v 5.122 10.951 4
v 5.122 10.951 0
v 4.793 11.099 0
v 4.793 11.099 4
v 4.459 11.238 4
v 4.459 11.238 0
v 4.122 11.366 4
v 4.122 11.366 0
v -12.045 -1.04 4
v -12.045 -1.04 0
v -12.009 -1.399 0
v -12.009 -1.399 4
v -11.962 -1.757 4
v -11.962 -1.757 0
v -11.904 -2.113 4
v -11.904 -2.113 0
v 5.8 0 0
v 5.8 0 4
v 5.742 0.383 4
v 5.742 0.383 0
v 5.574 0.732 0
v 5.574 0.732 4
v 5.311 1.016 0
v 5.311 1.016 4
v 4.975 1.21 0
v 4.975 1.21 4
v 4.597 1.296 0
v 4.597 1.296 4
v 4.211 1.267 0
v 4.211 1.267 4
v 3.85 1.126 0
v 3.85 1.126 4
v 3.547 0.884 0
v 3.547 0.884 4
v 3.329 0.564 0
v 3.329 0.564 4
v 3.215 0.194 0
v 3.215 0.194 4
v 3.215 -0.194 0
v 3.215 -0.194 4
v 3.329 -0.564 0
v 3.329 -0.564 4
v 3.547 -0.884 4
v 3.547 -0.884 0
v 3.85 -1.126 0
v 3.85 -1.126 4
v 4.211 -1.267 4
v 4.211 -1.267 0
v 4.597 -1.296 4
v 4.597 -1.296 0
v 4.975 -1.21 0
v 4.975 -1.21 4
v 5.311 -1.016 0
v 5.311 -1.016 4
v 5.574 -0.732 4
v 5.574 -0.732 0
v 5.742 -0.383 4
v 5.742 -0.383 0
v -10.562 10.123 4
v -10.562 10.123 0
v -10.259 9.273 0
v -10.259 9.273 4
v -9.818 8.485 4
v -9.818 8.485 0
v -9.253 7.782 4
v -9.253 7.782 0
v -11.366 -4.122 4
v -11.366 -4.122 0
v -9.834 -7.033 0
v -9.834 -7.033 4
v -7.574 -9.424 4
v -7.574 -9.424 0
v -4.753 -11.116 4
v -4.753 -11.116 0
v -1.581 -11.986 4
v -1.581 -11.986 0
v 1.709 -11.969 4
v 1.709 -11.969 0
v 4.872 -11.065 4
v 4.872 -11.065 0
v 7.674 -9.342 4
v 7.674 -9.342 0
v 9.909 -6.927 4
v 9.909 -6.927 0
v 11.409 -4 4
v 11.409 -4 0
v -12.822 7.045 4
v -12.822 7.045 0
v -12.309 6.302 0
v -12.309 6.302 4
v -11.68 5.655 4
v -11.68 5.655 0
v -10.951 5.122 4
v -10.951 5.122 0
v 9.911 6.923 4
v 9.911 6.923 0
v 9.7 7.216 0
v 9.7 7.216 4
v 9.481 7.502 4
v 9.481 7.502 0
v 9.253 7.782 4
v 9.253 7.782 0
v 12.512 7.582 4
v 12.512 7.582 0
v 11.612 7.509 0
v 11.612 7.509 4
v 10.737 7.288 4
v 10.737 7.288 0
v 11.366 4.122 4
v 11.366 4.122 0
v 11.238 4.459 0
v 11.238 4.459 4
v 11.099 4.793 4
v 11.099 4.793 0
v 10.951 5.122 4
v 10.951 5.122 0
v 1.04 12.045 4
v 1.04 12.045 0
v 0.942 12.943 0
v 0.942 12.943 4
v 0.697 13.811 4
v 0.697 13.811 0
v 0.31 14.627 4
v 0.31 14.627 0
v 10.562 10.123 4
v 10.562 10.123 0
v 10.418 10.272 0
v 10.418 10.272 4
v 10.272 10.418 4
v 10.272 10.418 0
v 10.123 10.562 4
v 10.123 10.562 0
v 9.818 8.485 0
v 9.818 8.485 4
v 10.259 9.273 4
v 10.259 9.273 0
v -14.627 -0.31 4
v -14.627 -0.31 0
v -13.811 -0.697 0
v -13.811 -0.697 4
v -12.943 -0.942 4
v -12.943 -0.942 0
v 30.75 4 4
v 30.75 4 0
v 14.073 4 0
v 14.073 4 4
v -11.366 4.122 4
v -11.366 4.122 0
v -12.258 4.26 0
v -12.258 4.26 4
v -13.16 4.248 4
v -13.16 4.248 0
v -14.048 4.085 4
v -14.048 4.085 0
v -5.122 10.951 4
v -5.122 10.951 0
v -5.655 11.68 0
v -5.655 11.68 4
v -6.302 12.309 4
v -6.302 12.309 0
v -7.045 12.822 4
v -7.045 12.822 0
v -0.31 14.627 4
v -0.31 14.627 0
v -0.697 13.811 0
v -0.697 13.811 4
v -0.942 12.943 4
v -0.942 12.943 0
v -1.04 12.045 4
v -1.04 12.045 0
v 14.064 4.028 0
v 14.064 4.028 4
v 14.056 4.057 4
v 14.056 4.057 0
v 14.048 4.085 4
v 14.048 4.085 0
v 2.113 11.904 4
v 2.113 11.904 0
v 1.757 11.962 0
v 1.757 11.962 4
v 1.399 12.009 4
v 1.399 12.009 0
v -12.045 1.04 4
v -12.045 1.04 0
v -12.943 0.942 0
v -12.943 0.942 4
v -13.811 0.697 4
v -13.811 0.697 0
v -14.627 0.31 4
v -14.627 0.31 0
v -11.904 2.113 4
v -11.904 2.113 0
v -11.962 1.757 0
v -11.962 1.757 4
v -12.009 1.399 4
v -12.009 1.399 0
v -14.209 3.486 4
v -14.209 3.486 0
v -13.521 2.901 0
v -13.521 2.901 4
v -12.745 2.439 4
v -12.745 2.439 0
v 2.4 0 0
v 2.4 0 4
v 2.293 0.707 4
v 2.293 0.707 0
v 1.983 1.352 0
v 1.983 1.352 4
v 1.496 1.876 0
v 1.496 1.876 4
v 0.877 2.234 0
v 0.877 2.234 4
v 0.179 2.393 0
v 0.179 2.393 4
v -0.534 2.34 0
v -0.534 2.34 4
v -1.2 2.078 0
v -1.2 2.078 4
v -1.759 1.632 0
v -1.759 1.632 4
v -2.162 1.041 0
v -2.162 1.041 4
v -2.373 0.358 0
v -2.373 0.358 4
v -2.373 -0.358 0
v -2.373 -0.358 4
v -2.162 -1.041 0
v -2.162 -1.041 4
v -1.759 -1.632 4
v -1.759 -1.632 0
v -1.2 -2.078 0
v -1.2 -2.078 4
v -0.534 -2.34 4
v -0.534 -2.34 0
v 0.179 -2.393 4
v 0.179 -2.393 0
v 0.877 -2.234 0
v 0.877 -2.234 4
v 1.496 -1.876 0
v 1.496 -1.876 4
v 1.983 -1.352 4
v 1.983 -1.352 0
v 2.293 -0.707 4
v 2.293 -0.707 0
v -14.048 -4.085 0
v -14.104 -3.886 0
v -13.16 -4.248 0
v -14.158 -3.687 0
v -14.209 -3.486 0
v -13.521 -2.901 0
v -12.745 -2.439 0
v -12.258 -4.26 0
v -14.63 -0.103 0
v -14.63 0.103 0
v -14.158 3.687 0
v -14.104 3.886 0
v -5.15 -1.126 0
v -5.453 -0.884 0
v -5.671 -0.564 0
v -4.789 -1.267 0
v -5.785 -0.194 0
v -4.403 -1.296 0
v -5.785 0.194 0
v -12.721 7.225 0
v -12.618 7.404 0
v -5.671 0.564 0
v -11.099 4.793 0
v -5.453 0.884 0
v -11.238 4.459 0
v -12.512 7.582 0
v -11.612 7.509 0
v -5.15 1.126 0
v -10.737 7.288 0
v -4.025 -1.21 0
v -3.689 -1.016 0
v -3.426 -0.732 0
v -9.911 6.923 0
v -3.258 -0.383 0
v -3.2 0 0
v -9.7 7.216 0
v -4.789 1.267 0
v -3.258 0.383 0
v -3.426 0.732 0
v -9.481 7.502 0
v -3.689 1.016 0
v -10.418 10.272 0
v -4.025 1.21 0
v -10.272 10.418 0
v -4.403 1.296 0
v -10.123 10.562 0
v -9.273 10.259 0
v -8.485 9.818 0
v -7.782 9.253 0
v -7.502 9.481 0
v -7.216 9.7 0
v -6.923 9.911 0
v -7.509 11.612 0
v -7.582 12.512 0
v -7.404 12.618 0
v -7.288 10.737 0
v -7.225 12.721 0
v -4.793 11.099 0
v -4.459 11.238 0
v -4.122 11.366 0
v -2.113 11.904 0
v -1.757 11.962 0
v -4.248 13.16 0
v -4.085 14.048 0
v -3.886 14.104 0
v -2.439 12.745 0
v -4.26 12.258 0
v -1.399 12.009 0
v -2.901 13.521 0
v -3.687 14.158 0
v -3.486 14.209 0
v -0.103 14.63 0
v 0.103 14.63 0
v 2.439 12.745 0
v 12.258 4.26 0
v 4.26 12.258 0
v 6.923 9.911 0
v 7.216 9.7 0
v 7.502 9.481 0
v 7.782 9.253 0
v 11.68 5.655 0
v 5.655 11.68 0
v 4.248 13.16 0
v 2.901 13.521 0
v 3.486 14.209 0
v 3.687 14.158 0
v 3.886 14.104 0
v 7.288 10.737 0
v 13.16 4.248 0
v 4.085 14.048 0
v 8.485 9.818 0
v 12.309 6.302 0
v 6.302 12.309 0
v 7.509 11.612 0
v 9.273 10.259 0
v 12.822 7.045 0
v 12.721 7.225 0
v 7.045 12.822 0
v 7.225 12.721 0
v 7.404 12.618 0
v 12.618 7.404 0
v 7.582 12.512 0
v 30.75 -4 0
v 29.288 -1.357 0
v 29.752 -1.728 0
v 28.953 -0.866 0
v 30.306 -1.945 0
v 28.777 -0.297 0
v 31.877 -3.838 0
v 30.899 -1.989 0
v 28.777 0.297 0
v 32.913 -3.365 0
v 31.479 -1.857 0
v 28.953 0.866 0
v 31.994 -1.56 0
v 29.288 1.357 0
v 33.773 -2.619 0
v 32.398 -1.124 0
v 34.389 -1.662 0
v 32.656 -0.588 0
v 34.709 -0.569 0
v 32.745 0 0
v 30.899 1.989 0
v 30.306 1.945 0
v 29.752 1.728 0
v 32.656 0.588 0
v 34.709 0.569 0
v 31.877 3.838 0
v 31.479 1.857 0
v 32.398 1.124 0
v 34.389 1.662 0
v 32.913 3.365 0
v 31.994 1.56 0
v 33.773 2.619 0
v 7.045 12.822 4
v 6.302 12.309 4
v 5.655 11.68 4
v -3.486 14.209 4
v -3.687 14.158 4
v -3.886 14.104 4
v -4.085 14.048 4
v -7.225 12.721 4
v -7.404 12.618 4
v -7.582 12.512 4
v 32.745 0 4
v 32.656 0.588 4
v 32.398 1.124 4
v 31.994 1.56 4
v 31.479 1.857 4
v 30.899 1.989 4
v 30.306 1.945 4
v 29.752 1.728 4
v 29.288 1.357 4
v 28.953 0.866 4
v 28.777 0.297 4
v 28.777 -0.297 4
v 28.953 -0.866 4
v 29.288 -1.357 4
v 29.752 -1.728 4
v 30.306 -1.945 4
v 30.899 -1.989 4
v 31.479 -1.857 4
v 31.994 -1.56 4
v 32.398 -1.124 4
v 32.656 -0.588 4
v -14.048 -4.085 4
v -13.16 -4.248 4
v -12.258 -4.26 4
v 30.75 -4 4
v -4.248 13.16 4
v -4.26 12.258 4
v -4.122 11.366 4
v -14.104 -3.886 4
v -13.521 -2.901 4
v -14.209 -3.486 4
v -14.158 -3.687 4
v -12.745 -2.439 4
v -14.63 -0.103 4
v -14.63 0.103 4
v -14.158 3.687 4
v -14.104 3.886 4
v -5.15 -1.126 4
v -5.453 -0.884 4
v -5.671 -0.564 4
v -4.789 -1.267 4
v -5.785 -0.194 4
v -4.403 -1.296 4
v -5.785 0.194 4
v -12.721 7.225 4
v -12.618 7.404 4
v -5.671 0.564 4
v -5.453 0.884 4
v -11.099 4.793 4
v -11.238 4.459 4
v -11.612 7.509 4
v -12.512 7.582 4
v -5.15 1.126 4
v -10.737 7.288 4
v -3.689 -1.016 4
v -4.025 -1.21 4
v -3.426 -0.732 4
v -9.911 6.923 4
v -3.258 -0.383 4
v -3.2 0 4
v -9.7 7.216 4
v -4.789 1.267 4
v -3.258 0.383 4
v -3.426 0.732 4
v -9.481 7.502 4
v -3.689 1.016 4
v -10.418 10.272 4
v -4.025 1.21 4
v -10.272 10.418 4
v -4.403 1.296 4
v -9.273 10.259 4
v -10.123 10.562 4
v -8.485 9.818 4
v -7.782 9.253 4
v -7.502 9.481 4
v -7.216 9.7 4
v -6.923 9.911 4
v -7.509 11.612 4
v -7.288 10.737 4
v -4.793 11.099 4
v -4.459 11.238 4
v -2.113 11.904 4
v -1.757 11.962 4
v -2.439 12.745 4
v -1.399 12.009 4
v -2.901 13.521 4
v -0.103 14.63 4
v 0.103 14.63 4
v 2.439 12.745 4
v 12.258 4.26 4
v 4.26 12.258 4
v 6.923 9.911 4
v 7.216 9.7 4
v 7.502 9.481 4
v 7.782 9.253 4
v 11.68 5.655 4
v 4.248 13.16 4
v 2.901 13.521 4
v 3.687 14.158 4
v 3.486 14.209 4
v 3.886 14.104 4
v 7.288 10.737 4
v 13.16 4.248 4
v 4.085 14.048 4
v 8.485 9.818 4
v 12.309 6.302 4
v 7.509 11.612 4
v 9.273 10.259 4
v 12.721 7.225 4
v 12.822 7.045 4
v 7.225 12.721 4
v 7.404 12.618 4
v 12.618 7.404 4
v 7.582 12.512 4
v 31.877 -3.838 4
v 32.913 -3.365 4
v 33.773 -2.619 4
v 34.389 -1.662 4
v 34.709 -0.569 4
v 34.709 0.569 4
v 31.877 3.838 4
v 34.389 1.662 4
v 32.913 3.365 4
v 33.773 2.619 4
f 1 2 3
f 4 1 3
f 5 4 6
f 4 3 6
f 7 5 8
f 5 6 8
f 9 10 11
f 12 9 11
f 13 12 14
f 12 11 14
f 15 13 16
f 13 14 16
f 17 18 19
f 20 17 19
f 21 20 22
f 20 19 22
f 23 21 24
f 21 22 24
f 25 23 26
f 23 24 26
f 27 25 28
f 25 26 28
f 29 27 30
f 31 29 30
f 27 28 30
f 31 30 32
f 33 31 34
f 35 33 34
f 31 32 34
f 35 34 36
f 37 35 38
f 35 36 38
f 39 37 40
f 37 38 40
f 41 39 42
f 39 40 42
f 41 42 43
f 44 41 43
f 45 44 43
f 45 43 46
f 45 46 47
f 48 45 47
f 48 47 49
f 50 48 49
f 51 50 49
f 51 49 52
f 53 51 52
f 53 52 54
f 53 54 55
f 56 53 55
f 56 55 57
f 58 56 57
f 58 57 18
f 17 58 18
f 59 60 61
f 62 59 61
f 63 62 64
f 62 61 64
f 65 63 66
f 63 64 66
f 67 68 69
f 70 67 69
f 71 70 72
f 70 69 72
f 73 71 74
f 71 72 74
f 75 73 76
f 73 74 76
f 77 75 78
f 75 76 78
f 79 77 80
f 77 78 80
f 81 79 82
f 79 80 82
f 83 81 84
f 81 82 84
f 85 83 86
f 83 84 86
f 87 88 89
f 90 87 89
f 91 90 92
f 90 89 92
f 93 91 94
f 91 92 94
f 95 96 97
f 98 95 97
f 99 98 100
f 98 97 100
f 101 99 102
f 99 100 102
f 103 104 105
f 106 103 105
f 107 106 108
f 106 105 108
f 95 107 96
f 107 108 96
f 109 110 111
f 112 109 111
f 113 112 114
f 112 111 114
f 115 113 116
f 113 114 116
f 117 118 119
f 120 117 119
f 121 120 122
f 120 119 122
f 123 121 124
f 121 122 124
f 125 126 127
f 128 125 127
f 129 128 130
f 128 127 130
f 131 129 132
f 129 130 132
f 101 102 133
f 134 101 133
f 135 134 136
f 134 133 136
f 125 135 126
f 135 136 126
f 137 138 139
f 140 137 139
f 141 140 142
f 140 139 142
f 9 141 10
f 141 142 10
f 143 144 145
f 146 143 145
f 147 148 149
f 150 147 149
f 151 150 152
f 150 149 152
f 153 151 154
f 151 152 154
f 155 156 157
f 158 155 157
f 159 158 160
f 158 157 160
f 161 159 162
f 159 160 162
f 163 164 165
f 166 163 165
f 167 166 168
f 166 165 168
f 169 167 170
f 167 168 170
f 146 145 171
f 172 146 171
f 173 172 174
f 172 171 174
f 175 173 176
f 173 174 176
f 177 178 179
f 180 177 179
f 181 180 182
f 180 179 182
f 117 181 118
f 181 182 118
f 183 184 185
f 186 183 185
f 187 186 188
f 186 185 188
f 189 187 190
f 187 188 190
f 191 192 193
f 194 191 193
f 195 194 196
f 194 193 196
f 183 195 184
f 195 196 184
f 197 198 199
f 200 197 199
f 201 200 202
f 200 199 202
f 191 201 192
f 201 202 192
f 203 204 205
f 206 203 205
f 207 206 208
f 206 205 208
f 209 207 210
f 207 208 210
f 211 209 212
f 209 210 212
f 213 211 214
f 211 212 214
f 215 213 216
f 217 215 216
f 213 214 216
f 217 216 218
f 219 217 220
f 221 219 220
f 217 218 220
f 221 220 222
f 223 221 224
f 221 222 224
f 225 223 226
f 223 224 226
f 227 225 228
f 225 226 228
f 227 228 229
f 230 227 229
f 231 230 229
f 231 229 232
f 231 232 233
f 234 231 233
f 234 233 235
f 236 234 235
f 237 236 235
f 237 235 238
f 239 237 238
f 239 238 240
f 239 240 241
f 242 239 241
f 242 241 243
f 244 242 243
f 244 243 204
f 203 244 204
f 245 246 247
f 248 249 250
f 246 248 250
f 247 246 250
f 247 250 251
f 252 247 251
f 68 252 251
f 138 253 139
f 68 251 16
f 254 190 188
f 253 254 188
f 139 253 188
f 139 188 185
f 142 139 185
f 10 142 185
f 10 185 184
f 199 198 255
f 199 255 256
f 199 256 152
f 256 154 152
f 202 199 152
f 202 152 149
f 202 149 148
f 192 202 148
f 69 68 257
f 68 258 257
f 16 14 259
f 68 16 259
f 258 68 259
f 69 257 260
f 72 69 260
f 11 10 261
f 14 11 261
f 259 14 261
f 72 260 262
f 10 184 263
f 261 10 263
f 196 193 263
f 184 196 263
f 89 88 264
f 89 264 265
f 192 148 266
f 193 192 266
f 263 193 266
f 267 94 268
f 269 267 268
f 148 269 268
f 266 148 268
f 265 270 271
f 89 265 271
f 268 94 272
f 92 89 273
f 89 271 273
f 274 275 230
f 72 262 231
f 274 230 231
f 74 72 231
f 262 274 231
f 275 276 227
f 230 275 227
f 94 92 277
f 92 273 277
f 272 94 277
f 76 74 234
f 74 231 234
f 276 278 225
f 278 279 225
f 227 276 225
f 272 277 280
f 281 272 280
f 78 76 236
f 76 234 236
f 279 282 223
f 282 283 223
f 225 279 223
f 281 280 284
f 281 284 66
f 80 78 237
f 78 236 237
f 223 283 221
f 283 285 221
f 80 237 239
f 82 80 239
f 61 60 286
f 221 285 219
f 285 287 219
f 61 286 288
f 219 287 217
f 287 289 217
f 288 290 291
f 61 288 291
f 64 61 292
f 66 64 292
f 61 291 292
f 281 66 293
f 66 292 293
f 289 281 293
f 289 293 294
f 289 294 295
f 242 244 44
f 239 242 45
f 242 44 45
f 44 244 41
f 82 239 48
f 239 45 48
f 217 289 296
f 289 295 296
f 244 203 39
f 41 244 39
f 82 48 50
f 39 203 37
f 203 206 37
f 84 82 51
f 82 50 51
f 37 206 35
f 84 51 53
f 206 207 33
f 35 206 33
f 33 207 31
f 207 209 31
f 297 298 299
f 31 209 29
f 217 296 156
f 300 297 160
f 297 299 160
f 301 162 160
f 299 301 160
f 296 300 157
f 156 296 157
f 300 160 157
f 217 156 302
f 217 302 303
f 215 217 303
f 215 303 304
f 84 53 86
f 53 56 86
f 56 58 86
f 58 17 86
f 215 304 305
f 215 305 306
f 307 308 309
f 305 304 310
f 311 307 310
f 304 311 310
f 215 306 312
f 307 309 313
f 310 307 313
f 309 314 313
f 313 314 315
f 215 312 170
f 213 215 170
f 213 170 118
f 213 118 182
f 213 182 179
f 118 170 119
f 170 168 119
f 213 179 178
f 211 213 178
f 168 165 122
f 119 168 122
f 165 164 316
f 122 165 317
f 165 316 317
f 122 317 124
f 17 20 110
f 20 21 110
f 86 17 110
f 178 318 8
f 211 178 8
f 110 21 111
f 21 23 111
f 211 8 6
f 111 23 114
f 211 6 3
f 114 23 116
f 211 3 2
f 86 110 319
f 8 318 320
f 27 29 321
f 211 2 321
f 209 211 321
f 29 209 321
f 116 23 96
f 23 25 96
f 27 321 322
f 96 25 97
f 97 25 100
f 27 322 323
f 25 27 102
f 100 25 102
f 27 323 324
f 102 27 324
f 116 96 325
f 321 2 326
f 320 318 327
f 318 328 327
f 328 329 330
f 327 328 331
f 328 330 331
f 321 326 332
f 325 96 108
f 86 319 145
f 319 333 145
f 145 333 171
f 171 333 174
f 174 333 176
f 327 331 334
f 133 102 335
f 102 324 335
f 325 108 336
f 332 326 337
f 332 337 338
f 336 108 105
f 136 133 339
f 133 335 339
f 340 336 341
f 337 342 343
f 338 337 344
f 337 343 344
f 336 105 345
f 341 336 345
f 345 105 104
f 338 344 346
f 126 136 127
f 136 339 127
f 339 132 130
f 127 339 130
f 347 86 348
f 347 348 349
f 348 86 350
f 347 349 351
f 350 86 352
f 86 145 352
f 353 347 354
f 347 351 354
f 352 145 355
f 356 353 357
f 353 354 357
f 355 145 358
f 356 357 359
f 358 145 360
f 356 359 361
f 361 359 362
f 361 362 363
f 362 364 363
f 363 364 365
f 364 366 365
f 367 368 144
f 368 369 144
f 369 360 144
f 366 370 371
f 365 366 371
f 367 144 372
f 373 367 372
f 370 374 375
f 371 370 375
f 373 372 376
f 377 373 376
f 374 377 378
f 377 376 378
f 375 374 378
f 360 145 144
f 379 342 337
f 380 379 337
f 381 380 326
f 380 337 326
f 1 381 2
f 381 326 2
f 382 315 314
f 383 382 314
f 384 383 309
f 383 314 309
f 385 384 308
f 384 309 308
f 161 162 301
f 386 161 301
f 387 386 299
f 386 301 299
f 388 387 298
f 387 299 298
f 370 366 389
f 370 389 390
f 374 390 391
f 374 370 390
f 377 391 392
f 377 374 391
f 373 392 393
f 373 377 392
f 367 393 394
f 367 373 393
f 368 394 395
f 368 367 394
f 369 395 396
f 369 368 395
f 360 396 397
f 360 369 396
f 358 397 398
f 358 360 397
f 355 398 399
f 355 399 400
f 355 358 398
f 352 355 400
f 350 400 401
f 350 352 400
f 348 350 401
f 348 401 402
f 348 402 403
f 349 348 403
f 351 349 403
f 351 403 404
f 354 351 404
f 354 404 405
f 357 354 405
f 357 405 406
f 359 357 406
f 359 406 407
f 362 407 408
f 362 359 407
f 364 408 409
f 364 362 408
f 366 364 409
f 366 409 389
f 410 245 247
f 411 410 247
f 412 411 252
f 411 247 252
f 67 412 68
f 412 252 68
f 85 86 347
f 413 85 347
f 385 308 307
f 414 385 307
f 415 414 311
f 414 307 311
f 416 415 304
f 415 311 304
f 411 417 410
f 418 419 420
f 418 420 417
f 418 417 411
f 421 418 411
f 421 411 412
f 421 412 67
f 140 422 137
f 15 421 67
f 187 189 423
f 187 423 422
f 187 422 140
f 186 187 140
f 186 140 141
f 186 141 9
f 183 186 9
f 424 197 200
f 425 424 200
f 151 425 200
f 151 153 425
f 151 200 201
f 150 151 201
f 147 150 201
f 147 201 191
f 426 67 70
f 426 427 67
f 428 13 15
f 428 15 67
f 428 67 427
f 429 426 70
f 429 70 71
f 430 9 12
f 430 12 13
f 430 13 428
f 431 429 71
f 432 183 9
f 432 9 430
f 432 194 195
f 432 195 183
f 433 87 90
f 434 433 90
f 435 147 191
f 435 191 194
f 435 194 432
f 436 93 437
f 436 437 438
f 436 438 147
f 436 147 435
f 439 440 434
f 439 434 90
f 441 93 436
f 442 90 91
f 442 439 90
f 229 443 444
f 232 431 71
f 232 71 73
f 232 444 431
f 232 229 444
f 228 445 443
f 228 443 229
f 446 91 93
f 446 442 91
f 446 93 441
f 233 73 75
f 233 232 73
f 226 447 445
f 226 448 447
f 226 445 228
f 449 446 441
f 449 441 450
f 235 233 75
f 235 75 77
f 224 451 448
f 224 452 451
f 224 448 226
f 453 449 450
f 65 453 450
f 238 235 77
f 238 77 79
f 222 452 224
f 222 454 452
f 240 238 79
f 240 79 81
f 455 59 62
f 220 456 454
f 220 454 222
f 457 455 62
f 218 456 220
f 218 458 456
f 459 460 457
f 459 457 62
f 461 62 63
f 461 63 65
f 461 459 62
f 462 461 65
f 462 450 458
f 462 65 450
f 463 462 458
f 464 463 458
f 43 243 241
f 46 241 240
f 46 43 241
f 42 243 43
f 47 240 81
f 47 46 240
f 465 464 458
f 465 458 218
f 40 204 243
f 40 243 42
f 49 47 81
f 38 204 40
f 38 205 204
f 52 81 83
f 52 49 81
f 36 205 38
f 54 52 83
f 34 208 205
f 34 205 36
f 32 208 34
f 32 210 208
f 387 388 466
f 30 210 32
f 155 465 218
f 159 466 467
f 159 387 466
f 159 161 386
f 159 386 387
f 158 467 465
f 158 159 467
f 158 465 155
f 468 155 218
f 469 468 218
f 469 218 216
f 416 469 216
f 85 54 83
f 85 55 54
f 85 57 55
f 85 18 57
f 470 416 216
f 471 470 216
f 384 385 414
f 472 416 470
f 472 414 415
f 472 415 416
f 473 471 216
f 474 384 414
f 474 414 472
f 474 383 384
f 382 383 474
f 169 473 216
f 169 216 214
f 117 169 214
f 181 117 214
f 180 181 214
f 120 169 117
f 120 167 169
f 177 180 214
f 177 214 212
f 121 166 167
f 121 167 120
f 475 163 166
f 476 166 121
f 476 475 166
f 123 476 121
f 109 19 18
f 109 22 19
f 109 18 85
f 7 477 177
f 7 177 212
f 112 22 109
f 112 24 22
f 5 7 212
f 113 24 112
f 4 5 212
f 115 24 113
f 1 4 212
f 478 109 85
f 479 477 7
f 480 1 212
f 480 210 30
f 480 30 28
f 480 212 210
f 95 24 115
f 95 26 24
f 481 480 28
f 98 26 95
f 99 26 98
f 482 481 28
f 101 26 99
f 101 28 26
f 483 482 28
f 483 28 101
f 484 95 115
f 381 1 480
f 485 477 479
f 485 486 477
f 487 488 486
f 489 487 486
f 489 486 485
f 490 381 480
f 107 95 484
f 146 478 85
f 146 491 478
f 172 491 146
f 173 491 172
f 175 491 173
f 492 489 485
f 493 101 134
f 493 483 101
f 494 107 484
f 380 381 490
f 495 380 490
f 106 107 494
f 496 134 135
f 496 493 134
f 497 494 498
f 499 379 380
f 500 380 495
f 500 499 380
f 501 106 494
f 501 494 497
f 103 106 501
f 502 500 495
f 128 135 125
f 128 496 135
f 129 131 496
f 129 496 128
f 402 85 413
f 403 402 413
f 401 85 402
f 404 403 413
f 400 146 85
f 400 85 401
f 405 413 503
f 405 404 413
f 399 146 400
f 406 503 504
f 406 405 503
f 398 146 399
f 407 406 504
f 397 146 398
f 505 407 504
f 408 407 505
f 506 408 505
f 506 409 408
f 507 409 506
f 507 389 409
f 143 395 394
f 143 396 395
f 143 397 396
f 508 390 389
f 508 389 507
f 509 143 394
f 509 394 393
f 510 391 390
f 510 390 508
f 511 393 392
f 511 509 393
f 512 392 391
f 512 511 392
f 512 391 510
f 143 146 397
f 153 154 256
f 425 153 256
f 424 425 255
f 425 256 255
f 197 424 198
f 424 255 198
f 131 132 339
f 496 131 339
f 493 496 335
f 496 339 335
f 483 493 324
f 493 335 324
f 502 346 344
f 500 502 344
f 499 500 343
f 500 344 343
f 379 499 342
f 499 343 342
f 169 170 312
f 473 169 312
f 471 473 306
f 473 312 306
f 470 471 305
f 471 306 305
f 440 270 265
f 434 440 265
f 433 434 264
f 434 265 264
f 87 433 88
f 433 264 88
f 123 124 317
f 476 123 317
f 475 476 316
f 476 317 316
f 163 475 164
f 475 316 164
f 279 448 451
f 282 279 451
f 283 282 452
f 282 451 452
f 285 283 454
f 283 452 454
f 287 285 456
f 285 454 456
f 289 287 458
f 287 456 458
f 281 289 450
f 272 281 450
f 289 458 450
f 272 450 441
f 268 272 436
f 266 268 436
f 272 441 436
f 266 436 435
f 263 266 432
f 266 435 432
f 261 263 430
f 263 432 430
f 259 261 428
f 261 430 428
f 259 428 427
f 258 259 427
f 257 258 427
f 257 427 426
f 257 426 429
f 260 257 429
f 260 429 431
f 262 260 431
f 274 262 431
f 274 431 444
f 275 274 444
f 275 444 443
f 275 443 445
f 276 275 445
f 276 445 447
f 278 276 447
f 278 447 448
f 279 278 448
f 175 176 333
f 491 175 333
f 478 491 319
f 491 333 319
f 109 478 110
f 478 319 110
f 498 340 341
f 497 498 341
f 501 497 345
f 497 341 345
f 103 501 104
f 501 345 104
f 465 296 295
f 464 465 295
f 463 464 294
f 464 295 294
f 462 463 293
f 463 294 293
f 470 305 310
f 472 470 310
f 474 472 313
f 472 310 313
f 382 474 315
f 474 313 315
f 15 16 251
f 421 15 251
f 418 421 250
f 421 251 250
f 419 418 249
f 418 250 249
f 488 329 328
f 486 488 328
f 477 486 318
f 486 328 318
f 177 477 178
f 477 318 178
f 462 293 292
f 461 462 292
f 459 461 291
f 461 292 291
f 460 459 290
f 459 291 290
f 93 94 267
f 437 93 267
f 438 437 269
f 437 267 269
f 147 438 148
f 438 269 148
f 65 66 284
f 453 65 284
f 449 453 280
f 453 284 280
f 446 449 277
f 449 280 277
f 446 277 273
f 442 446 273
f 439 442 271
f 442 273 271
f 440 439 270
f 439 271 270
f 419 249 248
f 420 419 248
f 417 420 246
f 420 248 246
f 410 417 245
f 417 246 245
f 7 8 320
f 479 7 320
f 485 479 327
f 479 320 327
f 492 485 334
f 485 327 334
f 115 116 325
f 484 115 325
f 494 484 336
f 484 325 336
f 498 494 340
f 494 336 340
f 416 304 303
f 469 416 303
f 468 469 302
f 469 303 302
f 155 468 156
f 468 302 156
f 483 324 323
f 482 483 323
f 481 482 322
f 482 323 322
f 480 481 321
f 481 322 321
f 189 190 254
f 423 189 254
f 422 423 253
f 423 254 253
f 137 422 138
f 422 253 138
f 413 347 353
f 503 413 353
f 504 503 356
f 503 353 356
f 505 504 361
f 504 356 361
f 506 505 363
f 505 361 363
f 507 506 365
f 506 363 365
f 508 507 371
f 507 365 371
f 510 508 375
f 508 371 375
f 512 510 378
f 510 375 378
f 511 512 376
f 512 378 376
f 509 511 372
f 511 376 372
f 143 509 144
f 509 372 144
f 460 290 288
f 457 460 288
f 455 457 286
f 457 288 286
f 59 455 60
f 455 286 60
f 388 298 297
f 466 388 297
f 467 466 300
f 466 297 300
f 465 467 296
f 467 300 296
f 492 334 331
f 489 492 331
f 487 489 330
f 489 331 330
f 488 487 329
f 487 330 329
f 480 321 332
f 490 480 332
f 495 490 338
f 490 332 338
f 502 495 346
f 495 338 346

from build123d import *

# Parameters (mm, degrees)
SKETCH2_R           = 1.75
SKETCH2_R_2         = 1.995
BOSS_EXTRUDE1_DEPTH = 4
SKETCH4_R           = 1.3
SKETCH4_R_2         = 2.4
CUT_EXTRUDE1_DEPTH  = 5


with BuildPart() as part:
    # Sketch2 → Boss-Extrude1 (new body)
    with BuildSketch(Plane.XY):
        with BuildLine():
            ThreePointArc((30.75, -4), (34.75, 0), (30.75, 4))
            Line((30.75, 4), (14.072558403, 4))
            ThreePointArc((14.072558403, 4), (14.06038767, 4.04257326), (14.048088143, 4.085109489))
            ThreePointArc((14.048088143, 4.085109489), (12.709169027, 4.272836063), (11.365584201, 4.122086336))
            ThreePointArc((11.365584201, 4.122086336), (11.169703548, 4.626642697), (10.951436862, 5.12192646))
            ThreePointArc((10.951436862, 5.12192646), (12.008090957, 5.965388247), (12.82210701, 7.044889767))
            ThreePointArc((12.82210701, 7.044889767), (12.669951657, 7.315), (12.51210701, 7.581825517))
            ThreePointArc((12.51210701, 7.581825517), (11.170223244, 7.416617696), (9.911436862, 6.9232593))
            ThreePointArc((9.911436862, 6.9232593), (9.591641884, 7.359925677), (9.252623584, 7.781841479))
            ThreePointArc((9.252623584, 7.781841479), (10.05496909, 8.870045207), (10.561852666, 10.123446462))
            ThreePointArc((10.561852666, 10.123446462), (10.344972209, 10.344972209), (10.123446462, 10.561852666))
            ThreePointArc((10.123446462, 10.561852666), (8.870045207, 10.05496909), (7.781841479, 9.252623584))
            ThreePointArc((7.781841479, 9.252623584), (7.359925677, 9.591641884), (6.9232593, 9.911436862))
            ThreePointArc((6.9232593, 9.911436862), (7.416617696, 11.170223244), (7.581825517, 12.51210701))
            ThreePointArc((7.581825517, 12.51210701), (7.315, 12.669951657), (7.044889767, 12.82210701))
            ThreePointArc((7.044889767, 12.82210701), (5.965388247, 12.008090957), (5.12192646, 10.951436862))
            ThreePointArc((5.12192646, 10.951436862), (4.626642697, 11.169703548), (4.122086336, 11.365584201))
            ThreePointArc((4.122086336, 11.365584201), (4.272836063, 12.709169027), (4.085109489, 14.048088143))
            ThreePointArc((4.085109489, 14.048088143), (3.78652263, 14.131494839), (3.486235477, 14.208555951))
            ThreePointArc((3.486235477, 14.208555951), (2.654199937, 13.14288127), (2.112960617, 11.903927815))
            ThreePointArc((2.112960617, 11.903927815), (1.578061664, 11.986568374), (1.04, 12.04518576))
            ThreePointArc((1.04, 12.04518576), (0.837867713, 13.382005944), (0.31, 14.626715284))
            ThreePointArc((0.31, 14.626715284), (0, 14.63), (-0.31, 14.626715284))
            ThreePointArc((-0.31, 14.626715284), (-0.837867713, 13.382005944), (-1.04, 12.04518576))
            ThreePointArc((-1.04, 12.04518576), (-1.578061664, 11.986568374), (-2.112960617, 11.903927815))
            ThreePointArc((-2.112960617, 11.903927815), (-2.654199937, 13.14288127), (-3.486235477, 14.208555951))
            ThreePointArc((-3.486235477, 14.208555951), (-3.78652263, 14.131494839), (-4.085109489, 14.048088143))
            ThreePointArc((-4.085109489, 14.048088143), (-4.272836063, 12.709169027), (-4.122086336, 11.365584201))
            ThreePointArc((-4.122086336, 11.365584201), (-4.626642697, 11.169703548), (-5.12192646, 10.951436862))
            ThreePointArc((-5.12192646, 10.951436862), (-5.965388247, 12.008090957), (-7.044889767, 12.82210701))
            ThreePointArc((-7.044889767, 12.82210701), (-7.315, 12.669951657), (-7.581825517, 12.51210701))
            ThreePointArc((-7.581825517, 12.51210701), (-7.416617696, 11.170223244), (-6.9232593, 9.911436862))
            ThreePointArc((-6.9232593, 9.911436862), (-7.359925677, 9.591641884), (-7.781841479, 9.252623584))
            ThreePointArc((-7.781841479, 9.252623584), (-8.870045207, 10.05496909), (-10.123446462, 10.561852666))
            ThreePointArc((-10.123446462, 10.561852666), (-10.344972209, 10.344972209), (-10.561852666, 10.123446462))
            ThreePointArc((-10.561852666, 10.123446462), (-10.05496909, 8.870045207), (-9.252623584, 7.781841479))
            ThreePointArc((-9.252623584, 7.781841479), (-9.591641884, 7.359925677), (-9.911436862, 6.9232593))
            ThreePointArc((-9.911436862, 6.9232593), (-11.170223244, 7.416617696), (-12.51210701, 7.581825517))
            ThreePointArc((-12.51210701, 7.581825517), (-12.669951657, 7.315), (-12.82210701, 7.044889767))
            ThreePointArc((-12.82210701, 7.044889767), (-12.008090957, 5.965388247), (-10.951436862, 5.12192646))
            ThreePointArc((-10.951436862, 5.12192646), (-11.169703548, 4.626642697), (-11.365584201, 4.122086336))
            ThreePointArc((-11.365584201, 4.122086336), (-12.709169027, 4.272836063), (-14.048088143, 4.085109489))
            ThreePointArc((-14.048088143, 4.085109489), (-14.131494839, 3.78652263), (-14.208555951, 3.486235477))
            ThreePointArc((-14.208555951, 3.486235477), (-13.14288127, 2.654199937), (-11.903927815, 2.112960617))
            ThreePointArc((-11.903927815, 2.112960617), (-11.986568374, 1.578061664), (-12.04518576, 1.04))
            ThreePointArc((-12.04518576, 1.04), (-13.382005944, 0.837867713), (-14.626715284, 0.31))
            ThreePointArc((-14.626715284, 0.31), (-14.63, 0), (-14.626715284, -0.31))
            ThreePointArc((-14.626715284, -0.31), (-13.382005944, -0.837867713), (-12.04518576, -1.04))
            ThreePointArc((-12.04518576, -1.04), (-11.986568374, -1.578061664), (-11.903927815, -2.112960617))
            ThreePointArc((-11.903927815, -2.112960617), (-13.14288127, -2.654199937), (-14.208555951, -3.486235477))
            ThreePointArc((-14.208555951, -3.486235477), (-14.131494839, -3.78652263), (-14.048088143, -4.085109489))
            ThreePointArc((-14.048088143, -4.085109489), (-12.709169027, -4.272836063), (-11.365584201, -4.122086336))
            ThreePointArc((-11.365584201, -4.122086336), (0.064808849, -12.089826294), (11.409123542, -4))
            Line((11.409123542, -4), (30.75, -4))
        make_face()
        Circle(SKETCH2_R, mode=Mode.SUBTRACT)
        with Locations((30.75, 0)):
            Circle(SKETCH2_R_2, mode=Mode.SUBTRACT)
    extrude(amount=BOSS_EXTRUDE1_DEPTH)

    # Sketch4 → Cut-Extrude1 (cut, through all)
    with BuildSketch(Plane.XY.offset(4)):
        with Locations((4.5, 0)):
            Circle(SKETCH4_R)
        with Locations((-4.5, 0)):
            Circle(SKETCH4_R)
        Circle(SKETCH4_R_2)
    extrude(amount=-CUT_EXTRUDE1_DEPTH, mode=Mode.SUBTRACT)


solid = part.part
